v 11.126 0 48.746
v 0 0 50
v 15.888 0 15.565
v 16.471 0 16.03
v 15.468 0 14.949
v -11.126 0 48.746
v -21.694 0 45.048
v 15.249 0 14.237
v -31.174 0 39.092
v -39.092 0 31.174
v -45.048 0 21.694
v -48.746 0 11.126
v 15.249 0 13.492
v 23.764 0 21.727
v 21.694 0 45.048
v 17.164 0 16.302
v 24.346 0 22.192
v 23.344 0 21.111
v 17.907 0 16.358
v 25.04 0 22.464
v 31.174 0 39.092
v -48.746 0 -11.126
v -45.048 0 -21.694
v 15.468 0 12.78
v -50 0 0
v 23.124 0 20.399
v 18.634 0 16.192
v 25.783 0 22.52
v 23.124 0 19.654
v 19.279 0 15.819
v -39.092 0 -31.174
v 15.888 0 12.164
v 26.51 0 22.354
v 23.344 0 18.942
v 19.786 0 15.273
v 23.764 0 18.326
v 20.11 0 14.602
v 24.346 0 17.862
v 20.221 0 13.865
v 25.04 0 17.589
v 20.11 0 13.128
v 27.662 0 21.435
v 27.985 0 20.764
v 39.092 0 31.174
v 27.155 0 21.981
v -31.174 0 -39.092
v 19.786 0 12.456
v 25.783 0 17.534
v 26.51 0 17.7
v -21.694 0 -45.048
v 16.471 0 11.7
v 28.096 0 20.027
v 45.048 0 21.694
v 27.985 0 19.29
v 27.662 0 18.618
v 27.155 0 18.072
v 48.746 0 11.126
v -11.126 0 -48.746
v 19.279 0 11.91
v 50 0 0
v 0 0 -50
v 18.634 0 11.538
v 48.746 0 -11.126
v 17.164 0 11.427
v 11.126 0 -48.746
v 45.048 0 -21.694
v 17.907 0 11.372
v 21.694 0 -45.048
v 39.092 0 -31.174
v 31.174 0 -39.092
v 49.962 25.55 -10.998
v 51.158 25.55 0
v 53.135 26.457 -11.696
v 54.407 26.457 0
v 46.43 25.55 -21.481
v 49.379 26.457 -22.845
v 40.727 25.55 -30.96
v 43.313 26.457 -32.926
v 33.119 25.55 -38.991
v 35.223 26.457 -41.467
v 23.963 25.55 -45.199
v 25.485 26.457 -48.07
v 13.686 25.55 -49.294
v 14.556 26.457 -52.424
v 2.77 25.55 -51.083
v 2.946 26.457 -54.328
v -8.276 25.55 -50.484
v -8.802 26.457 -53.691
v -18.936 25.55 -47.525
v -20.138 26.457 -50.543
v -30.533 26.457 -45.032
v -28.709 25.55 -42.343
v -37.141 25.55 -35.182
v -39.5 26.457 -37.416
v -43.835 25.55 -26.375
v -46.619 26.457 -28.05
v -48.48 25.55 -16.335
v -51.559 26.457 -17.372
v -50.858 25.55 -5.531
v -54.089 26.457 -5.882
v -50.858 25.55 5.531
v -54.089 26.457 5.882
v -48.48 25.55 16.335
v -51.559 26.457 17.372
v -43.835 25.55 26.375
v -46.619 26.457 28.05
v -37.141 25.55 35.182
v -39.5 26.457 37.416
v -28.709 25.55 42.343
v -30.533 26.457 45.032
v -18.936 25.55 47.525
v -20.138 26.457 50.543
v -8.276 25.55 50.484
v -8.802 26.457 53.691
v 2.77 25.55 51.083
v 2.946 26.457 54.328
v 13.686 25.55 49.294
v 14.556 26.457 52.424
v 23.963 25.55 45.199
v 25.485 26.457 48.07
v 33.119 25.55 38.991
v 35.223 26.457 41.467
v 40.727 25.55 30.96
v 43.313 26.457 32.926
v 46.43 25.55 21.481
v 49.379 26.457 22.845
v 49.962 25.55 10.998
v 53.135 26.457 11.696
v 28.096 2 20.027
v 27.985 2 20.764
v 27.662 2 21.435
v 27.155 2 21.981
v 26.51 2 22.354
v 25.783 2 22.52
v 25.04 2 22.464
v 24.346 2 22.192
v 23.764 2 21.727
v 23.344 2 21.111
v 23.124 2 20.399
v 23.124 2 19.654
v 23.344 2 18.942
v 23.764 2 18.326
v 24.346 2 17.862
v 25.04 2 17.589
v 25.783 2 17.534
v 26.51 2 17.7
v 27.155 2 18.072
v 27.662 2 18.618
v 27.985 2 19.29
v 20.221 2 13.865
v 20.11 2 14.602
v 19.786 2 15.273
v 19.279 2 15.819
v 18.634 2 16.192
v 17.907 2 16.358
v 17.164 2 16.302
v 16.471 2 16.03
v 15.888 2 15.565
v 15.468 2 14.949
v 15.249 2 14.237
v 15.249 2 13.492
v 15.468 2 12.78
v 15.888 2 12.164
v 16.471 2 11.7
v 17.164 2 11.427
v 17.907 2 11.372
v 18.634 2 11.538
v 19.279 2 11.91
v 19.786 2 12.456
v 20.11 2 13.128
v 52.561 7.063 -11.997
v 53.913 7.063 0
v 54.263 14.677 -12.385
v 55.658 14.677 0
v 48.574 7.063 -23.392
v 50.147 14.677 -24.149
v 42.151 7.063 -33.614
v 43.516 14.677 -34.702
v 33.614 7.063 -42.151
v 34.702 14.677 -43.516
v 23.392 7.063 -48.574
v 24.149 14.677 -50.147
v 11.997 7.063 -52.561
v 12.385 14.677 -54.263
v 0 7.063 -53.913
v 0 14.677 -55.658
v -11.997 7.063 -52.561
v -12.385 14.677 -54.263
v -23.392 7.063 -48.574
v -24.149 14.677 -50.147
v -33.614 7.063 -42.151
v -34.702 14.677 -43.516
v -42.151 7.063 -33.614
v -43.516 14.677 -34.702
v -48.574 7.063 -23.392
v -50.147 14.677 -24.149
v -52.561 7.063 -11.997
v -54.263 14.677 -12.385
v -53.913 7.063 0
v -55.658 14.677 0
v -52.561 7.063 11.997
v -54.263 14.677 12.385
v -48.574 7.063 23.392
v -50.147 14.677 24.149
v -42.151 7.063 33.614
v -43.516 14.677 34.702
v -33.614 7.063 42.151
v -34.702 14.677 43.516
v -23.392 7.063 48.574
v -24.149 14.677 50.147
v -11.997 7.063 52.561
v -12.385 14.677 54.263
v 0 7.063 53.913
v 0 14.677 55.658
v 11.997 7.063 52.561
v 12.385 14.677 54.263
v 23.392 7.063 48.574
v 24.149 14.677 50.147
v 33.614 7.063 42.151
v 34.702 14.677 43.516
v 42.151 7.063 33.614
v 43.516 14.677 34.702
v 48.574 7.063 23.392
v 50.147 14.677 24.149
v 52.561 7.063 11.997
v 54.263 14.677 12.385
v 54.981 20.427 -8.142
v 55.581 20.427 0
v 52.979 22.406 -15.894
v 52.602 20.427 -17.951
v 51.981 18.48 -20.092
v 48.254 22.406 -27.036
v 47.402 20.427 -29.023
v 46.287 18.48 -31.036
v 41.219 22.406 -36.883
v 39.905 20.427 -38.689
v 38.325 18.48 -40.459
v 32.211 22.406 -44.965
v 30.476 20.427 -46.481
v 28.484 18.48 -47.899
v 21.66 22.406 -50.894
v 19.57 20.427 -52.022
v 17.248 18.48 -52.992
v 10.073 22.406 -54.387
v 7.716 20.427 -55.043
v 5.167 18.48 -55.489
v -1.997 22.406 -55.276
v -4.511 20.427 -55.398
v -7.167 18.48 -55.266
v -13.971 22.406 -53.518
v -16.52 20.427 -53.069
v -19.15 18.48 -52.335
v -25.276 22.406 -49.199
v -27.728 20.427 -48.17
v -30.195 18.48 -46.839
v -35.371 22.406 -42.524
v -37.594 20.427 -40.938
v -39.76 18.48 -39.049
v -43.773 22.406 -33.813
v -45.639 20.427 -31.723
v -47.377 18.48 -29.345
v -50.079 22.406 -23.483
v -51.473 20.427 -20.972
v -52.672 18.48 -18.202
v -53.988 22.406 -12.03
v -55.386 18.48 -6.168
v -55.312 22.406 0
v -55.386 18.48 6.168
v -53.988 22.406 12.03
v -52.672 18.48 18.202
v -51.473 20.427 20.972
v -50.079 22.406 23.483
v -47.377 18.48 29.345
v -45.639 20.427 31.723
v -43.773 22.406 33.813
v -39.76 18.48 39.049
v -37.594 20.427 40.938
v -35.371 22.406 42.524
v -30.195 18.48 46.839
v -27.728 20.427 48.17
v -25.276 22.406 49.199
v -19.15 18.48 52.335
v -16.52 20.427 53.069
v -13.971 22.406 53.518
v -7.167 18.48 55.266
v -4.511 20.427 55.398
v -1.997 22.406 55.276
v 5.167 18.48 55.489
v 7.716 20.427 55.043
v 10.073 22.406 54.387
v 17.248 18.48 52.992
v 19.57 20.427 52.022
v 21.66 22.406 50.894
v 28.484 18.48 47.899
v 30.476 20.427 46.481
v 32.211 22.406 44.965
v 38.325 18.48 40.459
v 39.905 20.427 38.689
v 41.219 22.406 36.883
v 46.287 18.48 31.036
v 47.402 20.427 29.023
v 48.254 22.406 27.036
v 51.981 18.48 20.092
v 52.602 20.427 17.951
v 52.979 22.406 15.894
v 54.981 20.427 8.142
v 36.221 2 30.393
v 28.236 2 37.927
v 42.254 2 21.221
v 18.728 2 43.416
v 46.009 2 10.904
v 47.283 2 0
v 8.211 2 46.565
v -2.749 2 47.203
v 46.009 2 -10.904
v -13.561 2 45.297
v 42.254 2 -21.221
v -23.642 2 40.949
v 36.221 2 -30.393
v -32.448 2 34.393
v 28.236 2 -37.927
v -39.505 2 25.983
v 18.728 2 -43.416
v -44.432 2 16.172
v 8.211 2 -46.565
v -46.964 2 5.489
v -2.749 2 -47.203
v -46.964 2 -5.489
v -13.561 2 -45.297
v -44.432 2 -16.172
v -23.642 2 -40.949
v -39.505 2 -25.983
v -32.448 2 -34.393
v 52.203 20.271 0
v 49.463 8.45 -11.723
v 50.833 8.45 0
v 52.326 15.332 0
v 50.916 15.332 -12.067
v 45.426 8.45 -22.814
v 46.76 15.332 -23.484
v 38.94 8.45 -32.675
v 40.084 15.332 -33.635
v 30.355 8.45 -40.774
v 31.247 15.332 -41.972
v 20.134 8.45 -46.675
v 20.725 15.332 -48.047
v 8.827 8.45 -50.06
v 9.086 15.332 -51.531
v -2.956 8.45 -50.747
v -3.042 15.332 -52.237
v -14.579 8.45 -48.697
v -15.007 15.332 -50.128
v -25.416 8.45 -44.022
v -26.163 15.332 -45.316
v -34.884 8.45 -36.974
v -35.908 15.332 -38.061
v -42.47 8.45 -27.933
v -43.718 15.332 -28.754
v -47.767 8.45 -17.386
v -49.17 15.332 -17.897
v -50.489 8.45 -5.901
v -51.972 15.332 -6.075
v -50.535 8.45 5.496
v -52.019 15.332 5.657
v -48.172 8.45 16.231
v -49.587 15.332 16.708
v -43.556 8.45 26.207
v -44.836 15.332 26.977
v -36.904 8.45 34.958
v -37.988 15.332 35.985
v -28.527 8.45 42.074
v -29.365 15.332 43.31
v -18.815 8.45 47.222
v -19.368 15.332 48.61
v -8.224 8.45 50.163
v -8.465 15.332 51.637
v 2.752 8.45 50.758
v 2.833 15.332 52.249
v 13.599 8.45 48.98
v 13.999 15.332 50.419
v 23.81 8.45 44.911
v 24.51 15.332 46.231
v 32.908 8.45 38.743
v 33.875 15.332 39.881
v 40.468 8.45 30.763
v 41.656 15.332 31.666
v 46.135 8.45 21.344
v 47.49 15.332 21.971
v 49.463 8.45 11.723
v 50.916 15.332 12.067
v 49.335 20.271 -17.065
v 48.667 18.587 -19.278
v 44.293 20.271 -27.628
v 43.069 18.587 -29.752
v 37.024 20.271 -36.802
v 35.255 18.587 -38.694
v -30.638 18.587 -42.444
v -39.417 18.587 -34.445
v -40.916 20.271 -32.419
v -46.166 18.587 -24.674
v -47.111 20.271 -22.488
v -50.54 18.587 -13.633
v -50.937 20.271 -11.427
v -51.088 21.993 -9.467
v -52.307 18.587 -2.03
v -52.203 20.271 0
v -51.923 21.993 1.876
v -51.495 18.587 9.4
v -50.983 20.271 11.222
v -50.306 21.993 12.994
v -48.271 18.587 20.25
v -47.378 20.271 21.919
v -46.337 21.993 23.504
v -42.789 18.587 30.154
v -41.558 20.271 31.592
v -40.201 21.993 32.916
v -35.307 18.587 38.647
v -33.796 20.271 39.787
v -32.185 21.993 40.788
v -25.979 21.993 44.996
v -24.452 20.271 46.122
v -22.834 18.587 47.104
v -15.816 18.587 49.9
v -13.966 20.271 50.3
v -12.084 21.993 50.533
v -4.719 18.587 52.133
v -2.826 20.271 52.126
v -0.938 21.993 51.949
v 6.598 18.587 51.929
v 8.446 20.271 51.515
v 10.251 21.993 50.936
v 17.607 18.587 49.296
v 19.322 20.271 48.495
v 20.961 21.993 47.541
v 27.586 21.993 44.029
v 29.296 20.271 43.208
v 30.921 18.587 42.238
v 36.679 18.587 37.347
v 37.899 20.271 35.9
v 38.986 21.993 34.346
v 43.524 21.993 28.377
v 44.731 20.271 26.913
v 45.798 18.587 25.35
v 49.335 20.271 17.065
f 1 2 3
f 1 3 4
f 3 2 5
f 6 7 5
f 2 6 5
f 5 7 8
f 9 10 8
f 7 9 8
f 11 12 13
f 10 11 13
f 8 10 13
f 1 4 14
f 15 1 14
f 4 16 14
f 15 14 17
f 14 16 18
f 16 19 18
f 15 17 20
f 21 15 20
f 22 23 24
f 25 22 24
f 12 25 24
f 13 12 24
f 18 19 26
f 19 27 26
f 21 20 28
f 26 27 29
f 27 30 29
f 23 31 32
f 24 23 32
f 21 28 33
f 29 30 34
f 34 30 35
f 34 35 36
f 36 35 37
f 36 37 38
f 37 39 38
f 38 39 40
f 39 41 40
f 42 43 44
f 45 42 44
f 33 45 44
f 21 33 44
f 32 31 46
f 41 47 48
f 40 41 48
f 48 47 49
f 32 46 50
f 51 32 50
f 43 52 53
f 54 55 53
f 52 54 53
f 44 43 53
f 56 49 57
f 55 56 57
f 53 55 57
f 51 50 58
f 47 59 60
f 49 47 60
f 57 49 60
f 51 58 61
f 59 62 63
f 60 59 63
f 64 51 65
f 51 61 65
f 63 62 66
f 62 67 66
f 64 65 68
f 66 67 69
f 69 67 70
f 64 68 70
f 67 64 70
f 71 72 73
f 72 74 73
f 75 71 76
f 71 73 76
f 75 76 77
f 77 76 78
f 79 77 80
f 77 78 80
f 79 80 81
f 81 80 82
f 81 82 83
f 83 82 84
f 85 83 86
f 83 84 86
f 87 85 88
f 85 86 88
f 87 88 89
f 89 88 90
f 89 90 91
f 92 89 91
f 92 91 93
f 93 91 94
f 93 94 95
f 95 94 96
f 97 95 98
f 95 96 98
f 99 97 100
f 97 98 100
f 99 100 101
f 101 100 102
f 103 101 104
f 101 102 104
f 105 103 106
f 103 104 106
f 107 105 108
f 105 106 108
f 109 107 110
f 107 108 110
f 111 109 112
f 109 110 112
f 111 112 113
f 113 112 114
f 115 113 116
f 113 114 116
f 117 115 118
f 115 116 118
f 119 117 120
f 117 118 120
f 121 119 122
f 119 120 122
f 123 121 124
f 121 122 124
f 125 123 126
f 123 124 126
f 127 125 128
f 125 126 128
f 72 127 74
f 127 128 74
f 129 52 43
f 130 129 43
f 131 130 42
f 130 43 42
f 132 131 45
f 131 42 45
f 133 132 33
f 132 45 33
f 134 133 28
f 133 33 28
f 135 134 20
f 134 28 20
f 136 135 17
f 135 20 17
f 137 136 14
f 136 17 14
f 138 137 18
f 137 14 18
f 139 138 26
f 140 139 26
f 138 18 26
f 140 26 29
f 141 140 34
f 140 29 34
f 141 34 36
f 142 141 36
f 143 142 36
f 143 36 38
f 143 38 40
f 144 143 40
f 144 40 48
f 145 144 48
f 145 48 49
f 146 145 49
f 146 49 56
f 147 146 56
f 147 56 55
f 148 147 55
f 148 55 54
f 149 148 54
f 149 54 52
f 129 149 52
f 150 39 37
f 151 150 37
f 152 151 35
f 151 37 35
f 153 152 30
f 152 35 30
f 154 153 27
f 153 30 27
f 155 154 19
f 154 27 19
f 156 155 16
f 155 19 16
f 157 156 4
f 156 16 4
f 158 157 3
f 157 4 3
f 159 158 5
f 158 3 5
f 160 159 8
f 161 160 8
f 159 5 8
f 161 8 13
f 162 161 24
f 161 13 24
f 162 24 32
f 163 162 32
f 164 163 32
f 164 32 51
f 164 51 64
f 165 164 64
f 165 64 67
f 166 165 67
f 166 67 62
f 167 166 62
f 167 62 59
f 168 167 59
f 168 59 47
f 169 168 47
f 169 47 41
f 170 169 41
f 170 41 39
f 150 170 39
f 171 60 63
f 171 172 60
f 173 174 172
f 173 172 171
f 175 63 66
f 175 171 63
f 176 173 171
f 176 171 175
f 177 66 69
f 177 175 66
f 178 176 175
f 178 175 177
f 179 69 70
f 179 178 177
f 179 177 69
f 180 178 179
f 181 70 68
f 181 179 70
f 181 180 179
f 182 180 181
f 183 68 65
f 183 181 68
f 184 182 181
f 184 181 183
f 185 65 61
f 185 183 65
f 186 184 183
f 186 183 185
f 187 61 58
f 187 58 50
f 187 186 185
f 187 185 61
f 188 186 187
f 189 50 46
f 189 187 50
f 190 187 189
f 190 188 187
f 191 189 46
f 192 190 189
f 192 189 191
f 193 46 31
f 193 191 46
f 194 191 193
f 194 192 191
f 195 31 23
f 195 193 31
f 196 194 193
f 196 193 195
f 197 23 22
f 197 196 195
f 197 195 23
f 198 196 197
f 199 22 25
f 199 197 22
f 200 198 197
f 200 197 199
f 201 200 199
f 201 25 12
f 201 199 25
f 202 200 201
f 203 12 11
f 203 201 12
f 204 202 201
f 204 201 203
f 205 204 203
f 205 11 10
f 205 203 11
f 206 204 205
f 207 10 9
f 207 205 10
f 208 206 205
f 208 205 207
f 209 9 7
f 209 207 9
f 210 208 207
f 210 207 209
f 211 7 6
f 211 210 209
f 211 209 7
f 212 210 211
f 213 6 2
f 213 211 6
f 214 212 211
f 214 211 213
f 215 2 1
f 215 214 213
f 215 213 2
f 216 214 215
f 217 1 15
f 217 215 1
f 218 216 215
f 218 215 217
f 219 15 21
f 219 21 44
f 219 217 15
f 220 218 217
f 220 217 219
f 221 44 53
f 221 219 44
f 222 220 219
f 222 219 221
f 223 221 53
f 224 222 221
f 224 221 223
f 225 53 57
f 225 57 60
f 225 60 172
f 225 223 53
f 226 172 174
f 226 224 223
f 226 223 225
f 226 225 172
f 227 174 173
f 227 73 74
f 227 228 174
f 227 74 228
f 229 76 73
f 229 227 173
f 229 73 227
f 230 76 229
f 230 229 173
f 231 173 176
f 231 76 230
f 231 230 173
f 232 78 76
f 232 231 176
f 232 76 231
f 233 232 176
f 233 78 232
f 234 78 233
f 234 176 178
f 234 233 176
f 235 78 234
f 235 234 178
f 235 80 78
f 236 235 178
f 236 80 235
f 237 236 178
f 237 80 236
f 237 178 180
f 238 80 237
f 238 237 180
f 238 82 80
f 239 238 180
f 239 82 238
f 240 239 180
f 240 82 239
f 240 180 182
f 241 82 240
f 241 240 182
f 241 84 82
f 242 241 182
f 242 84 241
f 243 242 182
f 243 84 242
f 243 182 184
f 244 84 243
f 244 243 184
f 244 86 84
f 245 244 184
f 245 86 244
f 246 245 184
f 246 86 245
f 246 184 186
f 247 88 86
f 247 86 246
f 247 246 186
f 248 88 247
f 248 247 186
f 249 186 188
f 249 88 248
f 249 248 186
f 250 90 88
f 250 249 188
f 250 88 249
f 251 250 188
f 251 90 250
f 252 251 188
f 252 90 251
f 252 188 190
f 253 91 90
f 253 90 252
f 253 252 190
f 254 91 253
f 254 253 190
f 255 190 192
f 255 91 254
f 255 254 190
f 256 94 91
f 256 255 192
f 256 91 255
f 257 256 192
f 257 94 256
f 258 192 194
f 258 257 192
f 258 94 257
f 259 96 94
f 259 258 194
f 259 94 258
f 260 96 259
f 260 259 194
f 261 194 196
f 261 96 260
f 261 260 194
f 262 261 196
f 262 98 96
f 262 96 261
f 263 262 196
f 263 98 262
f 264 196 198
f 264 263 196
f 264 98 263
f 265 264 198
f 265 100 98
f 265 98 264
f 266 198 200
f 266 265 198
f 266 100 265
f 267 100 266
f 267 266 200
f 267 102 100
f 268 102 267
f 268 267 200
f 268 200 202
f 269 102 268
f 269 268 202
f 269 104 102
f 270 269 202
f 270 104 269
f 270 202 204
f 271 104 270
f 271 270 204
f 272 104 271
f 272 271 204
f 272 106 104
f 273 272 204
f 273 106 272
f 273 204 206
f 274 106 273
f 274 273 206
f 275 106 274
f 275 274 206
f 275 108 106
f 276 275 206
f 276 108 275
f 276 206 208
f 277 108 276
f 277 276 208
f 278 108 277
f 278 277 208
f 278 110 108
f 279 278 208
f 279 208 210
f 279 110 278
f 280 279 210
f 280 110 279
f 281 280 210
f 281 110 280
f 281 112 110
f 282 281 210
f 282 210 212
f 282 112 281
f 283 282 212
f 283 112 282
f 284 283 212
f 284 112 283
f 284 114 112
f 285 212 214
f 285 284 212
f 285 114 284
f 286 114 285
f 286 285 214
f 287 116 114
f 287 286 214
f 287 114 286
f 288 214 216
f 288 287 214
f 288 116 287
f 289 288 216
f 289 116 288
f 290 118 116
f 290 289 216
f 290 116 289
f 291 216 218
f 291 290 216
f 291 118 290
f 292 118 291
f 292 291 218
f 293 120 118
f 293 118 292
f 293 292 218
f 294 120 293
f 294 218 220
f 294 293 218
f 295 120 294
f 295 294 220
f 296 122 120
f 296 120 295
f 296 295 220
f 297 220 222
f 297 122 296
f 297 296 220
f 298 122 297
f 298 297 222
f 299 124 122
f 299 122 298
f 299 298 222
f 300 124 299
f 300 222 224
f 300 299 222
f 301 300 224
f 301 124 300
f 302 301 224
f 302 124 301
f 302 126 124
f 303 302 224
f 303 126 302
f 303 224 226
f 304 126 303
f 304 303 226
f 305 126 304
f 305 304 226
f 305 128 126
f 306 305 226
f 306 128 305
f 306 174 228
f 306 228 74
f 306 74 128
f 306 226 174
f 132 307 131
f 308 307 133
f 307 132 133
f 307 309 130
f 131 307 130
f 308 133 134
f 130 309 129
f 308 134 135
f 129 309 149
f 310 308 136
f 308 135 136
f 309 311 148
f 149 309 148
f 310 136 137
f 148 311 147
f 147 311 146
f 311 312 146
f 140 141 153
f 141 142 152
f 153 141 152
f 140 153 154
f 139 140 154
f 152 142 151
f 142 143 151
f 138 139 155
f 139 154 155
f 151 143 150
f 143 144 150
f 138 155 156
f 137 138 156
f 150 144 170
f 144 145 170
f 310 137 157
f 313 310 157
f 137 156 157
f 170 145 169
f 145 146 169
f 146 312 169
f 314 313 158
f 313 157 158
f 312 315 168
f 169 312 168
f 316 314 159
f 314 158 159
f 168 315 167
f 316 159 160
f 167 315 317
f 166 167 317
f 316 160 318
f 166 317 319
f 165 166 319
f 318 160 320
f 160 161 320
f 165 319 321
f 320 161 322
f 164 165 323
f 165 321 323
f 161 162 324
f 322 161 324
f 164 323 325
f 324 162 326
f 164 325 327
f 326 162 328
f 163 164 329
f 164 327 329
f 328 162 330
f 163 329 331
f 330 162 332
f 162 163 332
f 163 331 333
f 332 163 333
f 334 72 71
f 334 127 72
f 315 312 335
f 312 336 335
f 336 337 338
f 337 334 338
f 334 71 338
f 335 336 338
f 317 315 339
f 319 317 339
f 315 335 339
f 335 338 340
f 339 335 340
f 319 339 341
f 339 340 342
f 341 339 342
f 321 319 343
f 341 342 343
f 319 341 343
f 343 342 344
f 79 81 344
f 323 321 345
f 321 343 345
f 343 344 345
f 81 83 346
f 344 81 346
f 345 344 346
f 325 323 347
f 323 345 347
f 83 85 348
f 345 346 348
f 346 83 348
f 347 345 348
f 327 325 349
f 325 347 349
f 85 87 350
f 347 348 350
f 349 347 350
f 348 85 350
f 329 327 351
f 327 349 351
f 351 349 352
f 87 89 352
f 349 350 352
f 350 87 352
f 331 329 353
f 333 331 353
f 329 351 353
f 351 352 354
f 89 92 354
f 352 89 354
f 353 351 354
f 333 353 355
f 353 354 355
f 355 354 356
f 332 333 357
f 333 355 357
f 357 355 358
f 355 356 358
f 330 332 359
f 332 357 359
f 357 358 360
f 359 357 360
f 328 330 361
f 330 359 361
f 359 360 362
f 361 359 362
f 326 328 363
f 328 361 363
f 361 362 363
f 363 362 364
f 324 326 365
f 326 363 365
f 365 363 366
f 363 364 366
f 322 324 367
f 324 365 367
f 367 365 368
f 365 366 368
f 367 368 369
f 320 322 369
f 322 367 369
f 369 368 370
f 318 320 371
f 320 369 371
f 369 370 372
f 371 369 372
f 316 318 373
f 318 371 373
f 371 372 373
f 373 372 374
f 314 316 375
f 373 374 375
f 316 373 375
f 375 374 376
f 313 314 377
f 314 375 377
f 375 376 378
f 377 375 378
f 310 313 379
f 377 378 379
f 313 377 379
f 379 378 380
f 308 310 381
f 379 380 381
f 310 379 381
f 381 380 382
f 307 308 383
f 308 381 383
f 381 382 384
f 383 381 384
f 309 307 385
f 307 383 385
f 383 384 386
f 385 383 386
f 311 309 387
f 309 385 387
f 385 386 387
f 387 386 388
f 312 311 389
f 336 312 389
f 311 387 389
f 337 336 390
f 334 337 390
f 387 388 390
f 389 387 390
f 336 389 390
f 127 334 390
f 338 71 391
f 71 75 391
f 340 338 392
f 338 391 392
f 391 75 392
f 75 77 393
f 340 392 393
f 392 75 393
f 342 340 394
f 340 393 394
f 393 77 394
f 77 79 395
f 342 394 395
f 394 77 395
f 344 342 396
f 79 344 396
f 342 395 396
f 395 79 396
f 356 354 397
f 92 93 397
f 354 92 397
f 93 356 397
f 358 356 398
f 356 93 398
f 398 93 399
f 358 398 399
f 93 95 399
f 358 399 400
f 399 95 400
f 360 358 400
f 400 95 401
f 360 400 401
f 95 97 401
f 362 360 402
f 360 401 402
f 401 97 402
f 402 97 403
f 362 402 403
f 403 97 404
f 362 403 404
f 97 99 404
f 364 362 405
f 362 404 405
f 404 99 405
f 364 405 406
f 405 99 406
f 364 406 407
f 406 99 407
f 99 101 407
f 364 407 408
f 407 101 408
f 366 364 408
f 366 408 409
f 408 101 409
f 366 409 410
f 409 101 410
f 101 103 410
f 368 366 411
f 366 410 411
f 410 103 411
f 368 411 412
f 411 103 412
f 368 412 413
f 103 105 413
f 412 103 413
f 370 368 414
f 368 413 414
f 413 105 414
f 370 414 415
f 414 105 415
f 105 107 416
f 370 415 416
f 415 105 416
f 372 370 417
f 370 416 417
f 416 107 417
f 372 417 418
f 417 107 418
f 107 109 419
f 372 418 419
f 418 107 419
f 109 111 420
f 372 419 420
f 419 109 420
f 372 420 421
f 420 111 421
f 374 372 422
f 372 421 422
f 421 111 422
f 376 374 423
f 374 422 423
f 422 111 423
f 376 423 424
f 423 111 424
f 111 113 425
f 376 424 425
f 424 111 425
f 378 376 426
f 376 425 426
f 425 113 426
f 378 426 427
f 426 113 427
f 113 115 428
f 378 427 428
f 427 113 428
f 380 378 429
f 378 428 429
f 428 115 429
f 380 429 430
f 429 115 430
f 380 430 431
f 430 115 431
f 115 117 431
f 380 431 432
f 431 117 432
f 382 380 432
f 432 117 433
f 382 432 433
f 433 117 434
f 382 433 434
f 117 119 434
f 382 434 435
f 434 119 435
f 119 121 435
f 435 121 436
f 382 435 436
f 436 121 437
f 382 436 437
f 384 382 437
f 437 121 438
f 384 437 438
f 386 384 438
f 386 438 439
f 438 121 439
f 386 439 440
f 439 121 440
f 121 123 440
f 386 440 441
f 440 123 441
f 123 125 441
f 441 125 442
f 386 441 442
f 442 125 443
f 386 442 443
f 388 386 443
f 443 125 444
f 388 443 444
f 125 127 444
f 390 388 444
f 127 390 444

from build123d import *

# Parameters (mm, degrees)
SKETCH2_R          = 2.5
CUT_EXTRUDE2_DEPTH = 22


with BuildPart() as part:
    # Sketch1 → Revolve1 (revolve)
    with BuildSketch(Plane.XY):
        with BuildLine():
            add(Edge.make_bspline(
                [(51.158289136, 25.550050858), (54.407489378, 26.45683456)],
                knots=[0, 0, 1, 1], degree=1))
            add(Edge.make_bspline(
                [(50, 0), (58.550029809, 11.613224852), (54.407489378, 26.45683456)],
                knots=[0, 0, 0, 1, 1, 1], degree=2))
            Line((50, 0), (0, 0))
            Line((0, 0), (0, 2))
            Line((0, 2), (47.283465646, 2))
            add(Edge.make_bspline(
                [(47.283465646, 2), (50.153442659, 5.914089702), (52.221306271, 12.924512735), (52.569955472, 20.441362346), (51.158289136, 25.550050858)],
                knots=[0, 0, 0, 0.375, 0.625, 1, 1, 1], degree=2))
        make_face()
    revolve(axis=Axis((0, 0, 0), (0, 1, 0)))

    # Sketch2 → Cut-Extrude2 (cut)
    with BuildSketch(Plane.XZ):
        with Locations((25.596451493, 20.026773853)):
            Circle(SKETCH2_R)
        with Locations((17.720620264, 13.864689591)):
            Circle(SKETCH2_R)
    extrude(amount=-CUT_EXTRUDE2_DEPTH, mode=Mode.SUBTRACT)


solid = part.part
